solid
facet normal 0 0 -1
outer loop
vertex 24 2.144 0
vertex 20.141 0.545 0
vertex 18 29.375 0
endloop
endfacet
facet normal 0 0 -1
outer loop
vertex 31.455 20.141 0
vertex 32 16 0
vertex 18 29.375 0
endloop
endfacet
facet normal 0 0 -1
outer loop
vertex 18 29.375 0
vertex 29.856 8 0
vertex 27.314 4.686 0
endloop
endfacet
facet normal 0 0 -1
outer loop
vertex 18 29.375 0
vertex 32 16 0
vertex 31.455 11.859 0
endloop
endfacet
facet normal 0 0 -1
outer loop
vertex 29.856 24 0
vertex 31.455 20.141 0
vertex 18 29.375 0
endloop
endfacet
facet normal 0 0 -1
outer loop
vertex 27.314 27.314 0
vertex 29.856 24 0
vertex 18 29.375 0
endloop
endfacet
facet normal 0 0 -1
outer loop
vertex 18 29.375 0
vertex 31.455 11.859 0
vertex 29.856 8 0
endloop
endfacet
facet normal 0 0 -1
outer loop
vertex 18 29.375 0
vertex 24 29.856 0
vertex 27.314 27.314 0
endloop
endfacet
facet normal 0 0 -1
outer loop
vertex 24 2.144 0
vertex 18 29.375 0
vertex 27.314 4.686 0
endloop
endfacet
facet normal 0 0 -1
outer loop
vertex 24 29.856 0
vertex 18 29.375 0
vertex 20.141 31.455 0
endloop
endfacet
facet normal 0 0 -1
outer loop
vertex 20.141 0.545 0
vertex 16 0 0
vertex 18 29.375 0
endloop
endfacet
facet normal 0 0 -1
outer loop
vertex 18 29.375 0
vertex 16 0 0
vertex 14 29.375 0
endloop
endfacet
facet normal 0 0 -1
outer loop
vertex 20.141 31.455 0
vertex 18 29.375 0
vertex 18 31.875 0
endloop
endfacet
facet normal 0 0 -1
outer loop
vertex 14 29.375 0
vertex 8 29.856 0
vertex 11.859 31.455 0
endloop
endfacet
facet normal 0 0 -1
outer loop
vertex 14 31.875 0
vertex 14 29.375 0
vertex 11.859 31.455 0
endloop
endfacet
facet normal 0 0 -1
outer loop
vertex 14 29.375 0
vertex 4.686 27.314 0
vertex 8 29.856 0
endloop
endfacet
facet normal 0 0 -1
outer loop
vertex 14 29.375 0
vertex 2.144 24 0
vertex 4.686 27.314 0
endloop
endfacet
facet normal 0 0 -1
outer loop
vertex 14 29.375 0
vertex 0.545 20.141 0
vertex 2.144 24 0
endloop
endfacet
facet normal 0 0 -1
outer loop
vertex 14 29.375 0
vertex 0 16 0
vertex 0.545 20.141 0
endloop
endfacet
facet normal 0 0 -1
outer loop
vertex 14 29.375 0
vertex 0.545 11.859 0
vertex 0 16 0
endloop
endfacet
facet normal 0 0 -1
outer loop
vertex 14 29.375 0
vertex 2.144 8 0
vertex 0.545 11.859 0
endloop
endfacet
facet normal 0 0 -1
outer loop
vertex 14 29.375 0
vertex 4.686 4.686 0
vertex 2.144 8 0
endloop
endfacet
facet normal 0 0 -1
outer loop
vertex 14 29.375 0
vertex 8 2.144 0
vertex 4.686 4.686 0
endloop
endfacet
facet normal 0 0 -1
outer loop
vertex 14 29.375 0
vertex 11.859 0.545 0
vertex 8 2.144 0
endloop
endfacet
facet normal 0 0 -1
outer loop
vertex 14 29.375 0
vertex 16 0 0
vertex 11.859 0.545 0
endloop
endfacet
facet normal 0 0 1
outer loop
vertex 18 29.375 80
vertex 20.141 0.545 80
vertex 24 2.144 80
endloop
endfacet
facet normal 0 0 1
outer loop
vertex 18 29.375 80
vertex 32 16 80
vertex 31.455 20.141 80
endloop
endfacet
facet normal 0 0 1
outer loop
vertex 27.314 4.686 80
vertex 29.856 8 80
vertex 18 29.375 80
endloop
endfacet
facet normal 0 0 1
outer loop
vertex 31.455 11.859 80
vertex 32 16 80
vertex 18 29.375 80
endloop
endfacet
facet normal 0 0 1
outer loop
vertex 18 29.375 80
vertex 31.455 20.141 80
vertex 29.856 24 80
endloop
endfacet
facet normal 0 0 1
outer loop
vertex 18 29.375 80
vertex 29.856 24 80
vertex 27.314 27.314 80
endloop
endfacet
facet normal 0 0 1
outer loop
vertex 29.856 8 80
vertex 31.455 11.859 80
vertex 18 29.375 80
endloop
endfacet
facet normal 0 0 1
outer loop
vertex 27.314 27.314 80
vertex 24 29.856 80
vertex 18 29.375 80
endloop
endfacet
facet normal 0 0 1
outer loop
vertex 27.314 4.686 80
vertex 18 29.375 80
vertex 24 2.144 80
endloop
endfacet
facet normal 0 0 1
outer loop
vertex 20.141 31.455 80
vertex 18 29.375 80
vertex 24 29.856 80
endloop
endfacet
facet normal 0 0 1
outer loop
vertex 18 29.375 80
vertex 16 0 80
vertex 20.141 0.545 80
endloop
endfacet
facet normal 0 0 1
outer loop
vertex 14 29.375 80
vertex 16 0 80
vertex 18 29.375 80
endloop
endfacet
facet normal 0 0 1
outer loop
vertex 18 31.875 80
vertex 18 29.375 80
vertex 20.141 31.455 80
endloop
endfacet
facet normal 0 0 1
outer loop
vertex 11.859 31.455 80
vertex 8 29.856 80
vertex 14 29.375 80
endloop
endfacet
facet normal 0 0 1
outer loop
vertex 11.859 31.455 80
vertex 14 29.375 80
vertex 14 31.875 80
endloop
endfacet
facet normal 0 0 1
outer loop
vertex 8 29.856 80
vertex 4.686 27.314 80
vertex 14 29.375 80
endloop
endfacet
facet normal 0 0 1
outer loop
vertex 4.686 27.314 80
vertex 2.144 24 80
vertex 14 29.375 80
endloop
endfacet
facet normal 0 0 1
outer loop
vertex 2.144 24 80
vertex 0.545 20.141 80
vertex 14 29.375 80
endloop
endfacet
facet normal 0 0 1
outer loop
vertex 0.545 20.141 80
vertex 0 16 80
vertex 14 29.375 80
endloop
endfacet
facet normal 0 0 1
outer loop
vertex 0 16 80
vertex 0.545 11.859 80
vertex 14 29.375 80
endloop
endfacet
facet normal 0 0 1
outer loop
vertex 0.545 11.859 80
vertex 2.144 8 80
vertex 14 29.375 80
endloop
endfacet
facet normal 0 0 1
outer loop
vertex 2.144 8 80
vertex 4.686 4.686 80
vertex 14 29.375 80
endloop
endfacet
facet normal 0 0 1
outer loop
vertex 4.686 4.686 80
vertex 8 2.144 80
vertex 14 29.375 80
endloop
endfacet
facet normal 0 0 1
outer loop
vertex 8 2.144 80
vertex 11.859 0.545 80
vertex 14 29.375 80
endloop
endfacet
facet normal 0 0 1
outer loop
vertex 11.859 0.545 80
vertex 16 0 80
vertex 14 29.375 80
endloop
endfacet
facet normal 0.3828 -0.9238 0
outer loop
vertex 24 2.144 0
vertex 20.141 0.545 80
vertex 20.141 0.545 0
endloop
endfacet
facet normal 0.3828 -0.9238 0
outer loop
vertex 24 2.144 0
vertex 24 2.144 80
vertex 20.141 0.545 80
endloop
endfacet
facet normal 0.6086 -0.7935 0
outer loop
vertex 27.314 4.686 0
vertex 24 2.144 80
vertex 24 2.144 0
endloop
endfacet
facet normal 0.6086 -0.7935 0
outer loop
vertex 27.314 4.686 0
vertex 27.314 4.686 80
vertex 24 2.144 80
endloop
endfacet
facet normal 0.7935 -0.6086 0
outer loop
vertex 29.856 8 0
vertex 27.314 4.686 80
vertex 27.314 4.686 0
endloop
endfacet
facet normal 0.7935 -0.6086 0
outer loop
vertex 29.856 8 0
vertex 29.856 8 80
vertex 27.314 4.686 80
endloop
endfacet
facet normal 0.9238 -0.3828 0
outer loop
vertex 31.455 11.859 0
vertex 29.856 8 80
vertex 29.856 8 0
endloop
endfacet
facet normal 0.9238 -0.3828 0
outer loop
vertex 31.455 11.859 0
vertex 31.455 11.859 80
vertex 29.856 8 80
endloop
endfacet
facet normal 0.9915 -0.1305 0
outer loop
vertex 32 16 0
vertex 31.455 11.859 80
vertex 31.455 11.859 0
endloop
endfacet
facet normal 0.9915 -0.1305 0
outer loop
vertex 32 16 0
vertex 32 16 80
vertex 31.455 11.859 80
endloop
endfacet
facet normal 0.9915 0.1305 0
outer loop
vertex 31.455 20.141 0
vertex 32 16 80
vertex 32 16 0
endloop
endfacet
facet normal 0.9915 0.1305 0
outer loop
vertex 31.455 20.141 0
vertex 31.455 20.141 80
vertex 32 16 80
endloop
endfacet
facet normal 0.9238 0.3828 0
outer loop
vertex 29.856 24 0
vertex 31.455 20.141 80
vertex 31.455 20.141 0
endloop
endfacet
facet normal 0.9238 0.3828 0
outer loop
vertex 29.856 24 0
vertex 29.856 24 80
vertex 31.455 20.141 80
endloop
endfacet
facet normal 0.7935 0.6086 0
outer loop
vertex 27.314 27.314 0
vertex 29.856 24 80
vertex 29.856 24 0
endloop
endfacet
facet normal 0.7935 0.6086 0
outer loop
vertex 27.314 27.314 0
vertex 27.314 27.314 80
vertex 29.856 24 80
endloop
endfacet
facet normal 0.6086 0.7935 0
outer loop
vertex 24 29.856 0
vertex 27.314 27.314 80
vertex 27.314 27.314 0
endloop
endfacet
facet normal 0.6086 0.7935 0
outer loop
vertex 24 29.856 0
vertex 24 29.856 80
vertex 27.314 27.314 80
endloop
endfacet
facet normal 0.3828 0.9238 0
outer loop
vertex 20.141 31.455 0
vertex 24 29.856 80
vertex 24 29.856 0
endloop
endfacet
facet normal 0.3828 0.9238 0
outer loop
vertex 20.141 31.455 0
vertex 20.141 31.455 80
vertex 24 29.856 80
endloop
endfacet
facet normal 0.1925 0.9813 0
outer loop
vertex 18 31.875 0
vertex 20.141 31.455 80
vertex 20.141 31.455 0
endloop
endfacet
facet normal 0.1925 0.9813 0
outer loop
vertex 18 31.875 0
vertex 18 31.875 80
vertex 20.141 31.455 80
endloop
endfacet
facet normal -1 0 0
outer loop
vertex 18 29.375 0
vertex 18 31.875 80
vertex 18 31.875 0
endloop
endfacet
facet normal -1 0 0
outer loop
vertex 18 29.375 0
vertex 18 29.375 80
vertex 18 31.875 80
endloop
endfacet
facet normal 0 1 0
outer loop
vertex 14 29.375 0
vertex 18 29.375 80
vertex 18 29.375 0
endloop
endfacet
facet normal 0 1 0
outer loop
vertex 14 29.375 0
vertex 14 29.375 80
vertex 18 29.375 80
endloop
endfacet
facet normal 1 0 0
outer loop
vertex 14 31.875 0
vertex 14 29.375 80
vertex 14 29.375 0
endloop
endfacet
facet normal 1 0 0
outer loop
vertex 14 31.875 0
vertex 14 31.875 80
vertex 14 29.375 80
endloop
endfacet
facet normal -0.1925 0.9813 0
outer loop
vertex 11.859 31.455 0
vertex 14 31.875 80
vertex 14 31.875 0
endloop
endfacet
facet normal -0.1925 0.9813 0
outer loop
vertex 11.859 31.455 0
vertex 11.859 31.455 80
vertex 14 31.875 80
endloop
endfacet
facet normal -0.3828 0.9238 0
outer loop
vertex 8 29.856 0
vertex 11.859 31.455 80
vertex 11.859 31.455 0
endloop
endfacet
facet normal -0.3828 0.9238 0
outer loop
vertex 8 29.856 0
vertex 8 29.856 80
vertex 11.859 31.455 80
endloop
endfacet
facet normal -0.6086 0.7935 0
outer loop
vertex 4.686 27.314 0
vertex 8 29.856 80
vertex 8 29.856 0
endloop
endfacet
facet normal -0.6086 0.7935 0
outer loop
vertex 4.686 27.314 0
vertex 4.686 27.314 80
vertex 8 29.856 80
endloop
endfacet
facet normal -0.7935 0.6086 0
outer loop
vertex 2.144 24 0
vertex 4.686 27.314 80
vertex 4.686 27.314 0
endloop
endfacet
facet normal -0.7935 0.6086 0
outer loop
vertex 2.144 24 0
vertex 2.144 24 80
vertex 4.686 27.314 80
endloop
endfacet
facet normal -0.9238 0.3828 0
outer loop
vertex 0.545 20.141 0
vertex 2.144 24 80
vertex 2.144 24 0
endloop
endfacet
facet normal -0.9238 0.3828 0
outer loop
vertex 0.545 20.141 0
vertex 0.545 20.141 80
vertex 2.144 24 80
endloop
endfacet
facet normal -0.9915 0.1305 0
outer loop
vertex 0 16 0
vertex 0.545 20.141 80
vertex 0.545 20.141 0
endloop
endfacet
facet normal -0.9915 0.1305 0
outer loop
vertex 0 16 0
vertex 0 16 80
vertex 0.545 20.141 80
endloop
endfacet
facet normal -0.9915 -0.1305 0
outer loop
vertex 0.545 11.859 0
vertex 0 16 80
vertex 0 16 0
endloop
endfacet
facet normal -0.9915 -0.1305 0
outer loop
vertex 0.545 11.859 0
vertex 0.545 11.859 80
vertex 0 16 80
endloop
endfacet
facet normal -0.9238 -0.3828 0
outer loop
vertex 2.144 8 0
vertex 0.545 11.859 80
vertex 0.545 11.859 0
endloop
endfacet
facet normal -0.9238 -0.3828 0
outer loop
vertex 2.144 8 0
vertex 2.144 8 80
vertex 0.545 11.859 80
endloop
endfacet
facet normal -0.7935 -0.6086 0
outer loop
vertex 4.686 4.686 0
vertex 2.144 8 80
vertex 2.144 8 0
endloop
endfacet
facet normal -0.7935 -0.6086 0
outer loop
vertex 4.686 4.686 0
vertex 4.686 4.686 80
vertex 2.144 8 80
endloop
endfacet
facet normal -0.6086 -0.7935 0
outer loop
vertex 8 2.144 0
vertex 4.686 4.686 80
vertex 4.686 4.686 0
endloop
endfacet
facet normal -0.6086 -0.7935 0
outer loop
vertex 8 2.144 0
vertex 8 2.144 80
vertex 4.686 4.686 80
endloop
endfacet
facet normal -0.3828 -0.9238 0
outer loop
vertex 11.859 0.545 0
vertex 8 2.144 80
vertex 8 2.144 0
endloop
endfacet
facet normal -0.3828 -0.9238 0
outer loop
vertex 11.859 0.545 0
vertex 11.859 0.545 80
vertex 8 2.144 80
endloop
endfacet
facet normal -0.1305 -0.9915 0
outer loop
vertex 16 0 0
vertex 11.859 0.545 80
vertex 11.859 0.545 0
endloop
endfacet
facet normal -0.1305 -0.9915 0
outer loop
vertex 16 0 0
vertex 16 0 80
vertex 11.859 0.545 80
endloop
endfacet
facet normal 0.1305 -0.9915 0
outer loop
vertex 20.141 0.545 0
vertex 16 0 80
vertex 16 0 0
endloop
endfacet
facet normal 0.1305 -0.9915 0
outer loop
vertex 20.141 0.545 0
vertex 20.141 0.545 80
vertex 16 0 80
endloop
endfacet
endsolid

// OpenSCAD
$fn = 32;

// ----------------------------------------------------------------------
// Keyway shaft: d32 shaft, key 4 x 2.5 mm
// ----------------------------------------------------------------------

// --- parameters (mm) ---
shaft_r = 16;             // shaft radius
key_w = 4;                // keyway width
key_d = 2.5;              // keyway depth below the surface line
plate_t = 80;             // shaft length, Z (extrusion height)

shaft_d = 2 * shaft_r;  // shaft diameter
circle_step = 15;  // polygon sampling step, degrees

profile = [[11.859, 31.455], [8, 29.856], [4.686, 27.314], [2.144, 24], [0.545, 20.141], [0, 16], [0.545, 11.859], [2.144, 8], [4.686, 4.686], [8, 2.144], [11.859, 0.545], [16, 0], [20.141, 0.545], [24, 2.144], [27.314, 4.686], [29.856, 8], [31.455, 11.859], [32, 16], [31.455, 20.141], [29.856, 24], [27.314, 27.314], [24, 29.856], [20.141, 31.455], [18, 31.875], [18, 29.375], [14, 29.375], [14, 31.875]];  // primary outline, 27 points, counter clockwise

// --- the one profile operation ---
linear_extrude(height = plate_t) polygon(points = profile);
